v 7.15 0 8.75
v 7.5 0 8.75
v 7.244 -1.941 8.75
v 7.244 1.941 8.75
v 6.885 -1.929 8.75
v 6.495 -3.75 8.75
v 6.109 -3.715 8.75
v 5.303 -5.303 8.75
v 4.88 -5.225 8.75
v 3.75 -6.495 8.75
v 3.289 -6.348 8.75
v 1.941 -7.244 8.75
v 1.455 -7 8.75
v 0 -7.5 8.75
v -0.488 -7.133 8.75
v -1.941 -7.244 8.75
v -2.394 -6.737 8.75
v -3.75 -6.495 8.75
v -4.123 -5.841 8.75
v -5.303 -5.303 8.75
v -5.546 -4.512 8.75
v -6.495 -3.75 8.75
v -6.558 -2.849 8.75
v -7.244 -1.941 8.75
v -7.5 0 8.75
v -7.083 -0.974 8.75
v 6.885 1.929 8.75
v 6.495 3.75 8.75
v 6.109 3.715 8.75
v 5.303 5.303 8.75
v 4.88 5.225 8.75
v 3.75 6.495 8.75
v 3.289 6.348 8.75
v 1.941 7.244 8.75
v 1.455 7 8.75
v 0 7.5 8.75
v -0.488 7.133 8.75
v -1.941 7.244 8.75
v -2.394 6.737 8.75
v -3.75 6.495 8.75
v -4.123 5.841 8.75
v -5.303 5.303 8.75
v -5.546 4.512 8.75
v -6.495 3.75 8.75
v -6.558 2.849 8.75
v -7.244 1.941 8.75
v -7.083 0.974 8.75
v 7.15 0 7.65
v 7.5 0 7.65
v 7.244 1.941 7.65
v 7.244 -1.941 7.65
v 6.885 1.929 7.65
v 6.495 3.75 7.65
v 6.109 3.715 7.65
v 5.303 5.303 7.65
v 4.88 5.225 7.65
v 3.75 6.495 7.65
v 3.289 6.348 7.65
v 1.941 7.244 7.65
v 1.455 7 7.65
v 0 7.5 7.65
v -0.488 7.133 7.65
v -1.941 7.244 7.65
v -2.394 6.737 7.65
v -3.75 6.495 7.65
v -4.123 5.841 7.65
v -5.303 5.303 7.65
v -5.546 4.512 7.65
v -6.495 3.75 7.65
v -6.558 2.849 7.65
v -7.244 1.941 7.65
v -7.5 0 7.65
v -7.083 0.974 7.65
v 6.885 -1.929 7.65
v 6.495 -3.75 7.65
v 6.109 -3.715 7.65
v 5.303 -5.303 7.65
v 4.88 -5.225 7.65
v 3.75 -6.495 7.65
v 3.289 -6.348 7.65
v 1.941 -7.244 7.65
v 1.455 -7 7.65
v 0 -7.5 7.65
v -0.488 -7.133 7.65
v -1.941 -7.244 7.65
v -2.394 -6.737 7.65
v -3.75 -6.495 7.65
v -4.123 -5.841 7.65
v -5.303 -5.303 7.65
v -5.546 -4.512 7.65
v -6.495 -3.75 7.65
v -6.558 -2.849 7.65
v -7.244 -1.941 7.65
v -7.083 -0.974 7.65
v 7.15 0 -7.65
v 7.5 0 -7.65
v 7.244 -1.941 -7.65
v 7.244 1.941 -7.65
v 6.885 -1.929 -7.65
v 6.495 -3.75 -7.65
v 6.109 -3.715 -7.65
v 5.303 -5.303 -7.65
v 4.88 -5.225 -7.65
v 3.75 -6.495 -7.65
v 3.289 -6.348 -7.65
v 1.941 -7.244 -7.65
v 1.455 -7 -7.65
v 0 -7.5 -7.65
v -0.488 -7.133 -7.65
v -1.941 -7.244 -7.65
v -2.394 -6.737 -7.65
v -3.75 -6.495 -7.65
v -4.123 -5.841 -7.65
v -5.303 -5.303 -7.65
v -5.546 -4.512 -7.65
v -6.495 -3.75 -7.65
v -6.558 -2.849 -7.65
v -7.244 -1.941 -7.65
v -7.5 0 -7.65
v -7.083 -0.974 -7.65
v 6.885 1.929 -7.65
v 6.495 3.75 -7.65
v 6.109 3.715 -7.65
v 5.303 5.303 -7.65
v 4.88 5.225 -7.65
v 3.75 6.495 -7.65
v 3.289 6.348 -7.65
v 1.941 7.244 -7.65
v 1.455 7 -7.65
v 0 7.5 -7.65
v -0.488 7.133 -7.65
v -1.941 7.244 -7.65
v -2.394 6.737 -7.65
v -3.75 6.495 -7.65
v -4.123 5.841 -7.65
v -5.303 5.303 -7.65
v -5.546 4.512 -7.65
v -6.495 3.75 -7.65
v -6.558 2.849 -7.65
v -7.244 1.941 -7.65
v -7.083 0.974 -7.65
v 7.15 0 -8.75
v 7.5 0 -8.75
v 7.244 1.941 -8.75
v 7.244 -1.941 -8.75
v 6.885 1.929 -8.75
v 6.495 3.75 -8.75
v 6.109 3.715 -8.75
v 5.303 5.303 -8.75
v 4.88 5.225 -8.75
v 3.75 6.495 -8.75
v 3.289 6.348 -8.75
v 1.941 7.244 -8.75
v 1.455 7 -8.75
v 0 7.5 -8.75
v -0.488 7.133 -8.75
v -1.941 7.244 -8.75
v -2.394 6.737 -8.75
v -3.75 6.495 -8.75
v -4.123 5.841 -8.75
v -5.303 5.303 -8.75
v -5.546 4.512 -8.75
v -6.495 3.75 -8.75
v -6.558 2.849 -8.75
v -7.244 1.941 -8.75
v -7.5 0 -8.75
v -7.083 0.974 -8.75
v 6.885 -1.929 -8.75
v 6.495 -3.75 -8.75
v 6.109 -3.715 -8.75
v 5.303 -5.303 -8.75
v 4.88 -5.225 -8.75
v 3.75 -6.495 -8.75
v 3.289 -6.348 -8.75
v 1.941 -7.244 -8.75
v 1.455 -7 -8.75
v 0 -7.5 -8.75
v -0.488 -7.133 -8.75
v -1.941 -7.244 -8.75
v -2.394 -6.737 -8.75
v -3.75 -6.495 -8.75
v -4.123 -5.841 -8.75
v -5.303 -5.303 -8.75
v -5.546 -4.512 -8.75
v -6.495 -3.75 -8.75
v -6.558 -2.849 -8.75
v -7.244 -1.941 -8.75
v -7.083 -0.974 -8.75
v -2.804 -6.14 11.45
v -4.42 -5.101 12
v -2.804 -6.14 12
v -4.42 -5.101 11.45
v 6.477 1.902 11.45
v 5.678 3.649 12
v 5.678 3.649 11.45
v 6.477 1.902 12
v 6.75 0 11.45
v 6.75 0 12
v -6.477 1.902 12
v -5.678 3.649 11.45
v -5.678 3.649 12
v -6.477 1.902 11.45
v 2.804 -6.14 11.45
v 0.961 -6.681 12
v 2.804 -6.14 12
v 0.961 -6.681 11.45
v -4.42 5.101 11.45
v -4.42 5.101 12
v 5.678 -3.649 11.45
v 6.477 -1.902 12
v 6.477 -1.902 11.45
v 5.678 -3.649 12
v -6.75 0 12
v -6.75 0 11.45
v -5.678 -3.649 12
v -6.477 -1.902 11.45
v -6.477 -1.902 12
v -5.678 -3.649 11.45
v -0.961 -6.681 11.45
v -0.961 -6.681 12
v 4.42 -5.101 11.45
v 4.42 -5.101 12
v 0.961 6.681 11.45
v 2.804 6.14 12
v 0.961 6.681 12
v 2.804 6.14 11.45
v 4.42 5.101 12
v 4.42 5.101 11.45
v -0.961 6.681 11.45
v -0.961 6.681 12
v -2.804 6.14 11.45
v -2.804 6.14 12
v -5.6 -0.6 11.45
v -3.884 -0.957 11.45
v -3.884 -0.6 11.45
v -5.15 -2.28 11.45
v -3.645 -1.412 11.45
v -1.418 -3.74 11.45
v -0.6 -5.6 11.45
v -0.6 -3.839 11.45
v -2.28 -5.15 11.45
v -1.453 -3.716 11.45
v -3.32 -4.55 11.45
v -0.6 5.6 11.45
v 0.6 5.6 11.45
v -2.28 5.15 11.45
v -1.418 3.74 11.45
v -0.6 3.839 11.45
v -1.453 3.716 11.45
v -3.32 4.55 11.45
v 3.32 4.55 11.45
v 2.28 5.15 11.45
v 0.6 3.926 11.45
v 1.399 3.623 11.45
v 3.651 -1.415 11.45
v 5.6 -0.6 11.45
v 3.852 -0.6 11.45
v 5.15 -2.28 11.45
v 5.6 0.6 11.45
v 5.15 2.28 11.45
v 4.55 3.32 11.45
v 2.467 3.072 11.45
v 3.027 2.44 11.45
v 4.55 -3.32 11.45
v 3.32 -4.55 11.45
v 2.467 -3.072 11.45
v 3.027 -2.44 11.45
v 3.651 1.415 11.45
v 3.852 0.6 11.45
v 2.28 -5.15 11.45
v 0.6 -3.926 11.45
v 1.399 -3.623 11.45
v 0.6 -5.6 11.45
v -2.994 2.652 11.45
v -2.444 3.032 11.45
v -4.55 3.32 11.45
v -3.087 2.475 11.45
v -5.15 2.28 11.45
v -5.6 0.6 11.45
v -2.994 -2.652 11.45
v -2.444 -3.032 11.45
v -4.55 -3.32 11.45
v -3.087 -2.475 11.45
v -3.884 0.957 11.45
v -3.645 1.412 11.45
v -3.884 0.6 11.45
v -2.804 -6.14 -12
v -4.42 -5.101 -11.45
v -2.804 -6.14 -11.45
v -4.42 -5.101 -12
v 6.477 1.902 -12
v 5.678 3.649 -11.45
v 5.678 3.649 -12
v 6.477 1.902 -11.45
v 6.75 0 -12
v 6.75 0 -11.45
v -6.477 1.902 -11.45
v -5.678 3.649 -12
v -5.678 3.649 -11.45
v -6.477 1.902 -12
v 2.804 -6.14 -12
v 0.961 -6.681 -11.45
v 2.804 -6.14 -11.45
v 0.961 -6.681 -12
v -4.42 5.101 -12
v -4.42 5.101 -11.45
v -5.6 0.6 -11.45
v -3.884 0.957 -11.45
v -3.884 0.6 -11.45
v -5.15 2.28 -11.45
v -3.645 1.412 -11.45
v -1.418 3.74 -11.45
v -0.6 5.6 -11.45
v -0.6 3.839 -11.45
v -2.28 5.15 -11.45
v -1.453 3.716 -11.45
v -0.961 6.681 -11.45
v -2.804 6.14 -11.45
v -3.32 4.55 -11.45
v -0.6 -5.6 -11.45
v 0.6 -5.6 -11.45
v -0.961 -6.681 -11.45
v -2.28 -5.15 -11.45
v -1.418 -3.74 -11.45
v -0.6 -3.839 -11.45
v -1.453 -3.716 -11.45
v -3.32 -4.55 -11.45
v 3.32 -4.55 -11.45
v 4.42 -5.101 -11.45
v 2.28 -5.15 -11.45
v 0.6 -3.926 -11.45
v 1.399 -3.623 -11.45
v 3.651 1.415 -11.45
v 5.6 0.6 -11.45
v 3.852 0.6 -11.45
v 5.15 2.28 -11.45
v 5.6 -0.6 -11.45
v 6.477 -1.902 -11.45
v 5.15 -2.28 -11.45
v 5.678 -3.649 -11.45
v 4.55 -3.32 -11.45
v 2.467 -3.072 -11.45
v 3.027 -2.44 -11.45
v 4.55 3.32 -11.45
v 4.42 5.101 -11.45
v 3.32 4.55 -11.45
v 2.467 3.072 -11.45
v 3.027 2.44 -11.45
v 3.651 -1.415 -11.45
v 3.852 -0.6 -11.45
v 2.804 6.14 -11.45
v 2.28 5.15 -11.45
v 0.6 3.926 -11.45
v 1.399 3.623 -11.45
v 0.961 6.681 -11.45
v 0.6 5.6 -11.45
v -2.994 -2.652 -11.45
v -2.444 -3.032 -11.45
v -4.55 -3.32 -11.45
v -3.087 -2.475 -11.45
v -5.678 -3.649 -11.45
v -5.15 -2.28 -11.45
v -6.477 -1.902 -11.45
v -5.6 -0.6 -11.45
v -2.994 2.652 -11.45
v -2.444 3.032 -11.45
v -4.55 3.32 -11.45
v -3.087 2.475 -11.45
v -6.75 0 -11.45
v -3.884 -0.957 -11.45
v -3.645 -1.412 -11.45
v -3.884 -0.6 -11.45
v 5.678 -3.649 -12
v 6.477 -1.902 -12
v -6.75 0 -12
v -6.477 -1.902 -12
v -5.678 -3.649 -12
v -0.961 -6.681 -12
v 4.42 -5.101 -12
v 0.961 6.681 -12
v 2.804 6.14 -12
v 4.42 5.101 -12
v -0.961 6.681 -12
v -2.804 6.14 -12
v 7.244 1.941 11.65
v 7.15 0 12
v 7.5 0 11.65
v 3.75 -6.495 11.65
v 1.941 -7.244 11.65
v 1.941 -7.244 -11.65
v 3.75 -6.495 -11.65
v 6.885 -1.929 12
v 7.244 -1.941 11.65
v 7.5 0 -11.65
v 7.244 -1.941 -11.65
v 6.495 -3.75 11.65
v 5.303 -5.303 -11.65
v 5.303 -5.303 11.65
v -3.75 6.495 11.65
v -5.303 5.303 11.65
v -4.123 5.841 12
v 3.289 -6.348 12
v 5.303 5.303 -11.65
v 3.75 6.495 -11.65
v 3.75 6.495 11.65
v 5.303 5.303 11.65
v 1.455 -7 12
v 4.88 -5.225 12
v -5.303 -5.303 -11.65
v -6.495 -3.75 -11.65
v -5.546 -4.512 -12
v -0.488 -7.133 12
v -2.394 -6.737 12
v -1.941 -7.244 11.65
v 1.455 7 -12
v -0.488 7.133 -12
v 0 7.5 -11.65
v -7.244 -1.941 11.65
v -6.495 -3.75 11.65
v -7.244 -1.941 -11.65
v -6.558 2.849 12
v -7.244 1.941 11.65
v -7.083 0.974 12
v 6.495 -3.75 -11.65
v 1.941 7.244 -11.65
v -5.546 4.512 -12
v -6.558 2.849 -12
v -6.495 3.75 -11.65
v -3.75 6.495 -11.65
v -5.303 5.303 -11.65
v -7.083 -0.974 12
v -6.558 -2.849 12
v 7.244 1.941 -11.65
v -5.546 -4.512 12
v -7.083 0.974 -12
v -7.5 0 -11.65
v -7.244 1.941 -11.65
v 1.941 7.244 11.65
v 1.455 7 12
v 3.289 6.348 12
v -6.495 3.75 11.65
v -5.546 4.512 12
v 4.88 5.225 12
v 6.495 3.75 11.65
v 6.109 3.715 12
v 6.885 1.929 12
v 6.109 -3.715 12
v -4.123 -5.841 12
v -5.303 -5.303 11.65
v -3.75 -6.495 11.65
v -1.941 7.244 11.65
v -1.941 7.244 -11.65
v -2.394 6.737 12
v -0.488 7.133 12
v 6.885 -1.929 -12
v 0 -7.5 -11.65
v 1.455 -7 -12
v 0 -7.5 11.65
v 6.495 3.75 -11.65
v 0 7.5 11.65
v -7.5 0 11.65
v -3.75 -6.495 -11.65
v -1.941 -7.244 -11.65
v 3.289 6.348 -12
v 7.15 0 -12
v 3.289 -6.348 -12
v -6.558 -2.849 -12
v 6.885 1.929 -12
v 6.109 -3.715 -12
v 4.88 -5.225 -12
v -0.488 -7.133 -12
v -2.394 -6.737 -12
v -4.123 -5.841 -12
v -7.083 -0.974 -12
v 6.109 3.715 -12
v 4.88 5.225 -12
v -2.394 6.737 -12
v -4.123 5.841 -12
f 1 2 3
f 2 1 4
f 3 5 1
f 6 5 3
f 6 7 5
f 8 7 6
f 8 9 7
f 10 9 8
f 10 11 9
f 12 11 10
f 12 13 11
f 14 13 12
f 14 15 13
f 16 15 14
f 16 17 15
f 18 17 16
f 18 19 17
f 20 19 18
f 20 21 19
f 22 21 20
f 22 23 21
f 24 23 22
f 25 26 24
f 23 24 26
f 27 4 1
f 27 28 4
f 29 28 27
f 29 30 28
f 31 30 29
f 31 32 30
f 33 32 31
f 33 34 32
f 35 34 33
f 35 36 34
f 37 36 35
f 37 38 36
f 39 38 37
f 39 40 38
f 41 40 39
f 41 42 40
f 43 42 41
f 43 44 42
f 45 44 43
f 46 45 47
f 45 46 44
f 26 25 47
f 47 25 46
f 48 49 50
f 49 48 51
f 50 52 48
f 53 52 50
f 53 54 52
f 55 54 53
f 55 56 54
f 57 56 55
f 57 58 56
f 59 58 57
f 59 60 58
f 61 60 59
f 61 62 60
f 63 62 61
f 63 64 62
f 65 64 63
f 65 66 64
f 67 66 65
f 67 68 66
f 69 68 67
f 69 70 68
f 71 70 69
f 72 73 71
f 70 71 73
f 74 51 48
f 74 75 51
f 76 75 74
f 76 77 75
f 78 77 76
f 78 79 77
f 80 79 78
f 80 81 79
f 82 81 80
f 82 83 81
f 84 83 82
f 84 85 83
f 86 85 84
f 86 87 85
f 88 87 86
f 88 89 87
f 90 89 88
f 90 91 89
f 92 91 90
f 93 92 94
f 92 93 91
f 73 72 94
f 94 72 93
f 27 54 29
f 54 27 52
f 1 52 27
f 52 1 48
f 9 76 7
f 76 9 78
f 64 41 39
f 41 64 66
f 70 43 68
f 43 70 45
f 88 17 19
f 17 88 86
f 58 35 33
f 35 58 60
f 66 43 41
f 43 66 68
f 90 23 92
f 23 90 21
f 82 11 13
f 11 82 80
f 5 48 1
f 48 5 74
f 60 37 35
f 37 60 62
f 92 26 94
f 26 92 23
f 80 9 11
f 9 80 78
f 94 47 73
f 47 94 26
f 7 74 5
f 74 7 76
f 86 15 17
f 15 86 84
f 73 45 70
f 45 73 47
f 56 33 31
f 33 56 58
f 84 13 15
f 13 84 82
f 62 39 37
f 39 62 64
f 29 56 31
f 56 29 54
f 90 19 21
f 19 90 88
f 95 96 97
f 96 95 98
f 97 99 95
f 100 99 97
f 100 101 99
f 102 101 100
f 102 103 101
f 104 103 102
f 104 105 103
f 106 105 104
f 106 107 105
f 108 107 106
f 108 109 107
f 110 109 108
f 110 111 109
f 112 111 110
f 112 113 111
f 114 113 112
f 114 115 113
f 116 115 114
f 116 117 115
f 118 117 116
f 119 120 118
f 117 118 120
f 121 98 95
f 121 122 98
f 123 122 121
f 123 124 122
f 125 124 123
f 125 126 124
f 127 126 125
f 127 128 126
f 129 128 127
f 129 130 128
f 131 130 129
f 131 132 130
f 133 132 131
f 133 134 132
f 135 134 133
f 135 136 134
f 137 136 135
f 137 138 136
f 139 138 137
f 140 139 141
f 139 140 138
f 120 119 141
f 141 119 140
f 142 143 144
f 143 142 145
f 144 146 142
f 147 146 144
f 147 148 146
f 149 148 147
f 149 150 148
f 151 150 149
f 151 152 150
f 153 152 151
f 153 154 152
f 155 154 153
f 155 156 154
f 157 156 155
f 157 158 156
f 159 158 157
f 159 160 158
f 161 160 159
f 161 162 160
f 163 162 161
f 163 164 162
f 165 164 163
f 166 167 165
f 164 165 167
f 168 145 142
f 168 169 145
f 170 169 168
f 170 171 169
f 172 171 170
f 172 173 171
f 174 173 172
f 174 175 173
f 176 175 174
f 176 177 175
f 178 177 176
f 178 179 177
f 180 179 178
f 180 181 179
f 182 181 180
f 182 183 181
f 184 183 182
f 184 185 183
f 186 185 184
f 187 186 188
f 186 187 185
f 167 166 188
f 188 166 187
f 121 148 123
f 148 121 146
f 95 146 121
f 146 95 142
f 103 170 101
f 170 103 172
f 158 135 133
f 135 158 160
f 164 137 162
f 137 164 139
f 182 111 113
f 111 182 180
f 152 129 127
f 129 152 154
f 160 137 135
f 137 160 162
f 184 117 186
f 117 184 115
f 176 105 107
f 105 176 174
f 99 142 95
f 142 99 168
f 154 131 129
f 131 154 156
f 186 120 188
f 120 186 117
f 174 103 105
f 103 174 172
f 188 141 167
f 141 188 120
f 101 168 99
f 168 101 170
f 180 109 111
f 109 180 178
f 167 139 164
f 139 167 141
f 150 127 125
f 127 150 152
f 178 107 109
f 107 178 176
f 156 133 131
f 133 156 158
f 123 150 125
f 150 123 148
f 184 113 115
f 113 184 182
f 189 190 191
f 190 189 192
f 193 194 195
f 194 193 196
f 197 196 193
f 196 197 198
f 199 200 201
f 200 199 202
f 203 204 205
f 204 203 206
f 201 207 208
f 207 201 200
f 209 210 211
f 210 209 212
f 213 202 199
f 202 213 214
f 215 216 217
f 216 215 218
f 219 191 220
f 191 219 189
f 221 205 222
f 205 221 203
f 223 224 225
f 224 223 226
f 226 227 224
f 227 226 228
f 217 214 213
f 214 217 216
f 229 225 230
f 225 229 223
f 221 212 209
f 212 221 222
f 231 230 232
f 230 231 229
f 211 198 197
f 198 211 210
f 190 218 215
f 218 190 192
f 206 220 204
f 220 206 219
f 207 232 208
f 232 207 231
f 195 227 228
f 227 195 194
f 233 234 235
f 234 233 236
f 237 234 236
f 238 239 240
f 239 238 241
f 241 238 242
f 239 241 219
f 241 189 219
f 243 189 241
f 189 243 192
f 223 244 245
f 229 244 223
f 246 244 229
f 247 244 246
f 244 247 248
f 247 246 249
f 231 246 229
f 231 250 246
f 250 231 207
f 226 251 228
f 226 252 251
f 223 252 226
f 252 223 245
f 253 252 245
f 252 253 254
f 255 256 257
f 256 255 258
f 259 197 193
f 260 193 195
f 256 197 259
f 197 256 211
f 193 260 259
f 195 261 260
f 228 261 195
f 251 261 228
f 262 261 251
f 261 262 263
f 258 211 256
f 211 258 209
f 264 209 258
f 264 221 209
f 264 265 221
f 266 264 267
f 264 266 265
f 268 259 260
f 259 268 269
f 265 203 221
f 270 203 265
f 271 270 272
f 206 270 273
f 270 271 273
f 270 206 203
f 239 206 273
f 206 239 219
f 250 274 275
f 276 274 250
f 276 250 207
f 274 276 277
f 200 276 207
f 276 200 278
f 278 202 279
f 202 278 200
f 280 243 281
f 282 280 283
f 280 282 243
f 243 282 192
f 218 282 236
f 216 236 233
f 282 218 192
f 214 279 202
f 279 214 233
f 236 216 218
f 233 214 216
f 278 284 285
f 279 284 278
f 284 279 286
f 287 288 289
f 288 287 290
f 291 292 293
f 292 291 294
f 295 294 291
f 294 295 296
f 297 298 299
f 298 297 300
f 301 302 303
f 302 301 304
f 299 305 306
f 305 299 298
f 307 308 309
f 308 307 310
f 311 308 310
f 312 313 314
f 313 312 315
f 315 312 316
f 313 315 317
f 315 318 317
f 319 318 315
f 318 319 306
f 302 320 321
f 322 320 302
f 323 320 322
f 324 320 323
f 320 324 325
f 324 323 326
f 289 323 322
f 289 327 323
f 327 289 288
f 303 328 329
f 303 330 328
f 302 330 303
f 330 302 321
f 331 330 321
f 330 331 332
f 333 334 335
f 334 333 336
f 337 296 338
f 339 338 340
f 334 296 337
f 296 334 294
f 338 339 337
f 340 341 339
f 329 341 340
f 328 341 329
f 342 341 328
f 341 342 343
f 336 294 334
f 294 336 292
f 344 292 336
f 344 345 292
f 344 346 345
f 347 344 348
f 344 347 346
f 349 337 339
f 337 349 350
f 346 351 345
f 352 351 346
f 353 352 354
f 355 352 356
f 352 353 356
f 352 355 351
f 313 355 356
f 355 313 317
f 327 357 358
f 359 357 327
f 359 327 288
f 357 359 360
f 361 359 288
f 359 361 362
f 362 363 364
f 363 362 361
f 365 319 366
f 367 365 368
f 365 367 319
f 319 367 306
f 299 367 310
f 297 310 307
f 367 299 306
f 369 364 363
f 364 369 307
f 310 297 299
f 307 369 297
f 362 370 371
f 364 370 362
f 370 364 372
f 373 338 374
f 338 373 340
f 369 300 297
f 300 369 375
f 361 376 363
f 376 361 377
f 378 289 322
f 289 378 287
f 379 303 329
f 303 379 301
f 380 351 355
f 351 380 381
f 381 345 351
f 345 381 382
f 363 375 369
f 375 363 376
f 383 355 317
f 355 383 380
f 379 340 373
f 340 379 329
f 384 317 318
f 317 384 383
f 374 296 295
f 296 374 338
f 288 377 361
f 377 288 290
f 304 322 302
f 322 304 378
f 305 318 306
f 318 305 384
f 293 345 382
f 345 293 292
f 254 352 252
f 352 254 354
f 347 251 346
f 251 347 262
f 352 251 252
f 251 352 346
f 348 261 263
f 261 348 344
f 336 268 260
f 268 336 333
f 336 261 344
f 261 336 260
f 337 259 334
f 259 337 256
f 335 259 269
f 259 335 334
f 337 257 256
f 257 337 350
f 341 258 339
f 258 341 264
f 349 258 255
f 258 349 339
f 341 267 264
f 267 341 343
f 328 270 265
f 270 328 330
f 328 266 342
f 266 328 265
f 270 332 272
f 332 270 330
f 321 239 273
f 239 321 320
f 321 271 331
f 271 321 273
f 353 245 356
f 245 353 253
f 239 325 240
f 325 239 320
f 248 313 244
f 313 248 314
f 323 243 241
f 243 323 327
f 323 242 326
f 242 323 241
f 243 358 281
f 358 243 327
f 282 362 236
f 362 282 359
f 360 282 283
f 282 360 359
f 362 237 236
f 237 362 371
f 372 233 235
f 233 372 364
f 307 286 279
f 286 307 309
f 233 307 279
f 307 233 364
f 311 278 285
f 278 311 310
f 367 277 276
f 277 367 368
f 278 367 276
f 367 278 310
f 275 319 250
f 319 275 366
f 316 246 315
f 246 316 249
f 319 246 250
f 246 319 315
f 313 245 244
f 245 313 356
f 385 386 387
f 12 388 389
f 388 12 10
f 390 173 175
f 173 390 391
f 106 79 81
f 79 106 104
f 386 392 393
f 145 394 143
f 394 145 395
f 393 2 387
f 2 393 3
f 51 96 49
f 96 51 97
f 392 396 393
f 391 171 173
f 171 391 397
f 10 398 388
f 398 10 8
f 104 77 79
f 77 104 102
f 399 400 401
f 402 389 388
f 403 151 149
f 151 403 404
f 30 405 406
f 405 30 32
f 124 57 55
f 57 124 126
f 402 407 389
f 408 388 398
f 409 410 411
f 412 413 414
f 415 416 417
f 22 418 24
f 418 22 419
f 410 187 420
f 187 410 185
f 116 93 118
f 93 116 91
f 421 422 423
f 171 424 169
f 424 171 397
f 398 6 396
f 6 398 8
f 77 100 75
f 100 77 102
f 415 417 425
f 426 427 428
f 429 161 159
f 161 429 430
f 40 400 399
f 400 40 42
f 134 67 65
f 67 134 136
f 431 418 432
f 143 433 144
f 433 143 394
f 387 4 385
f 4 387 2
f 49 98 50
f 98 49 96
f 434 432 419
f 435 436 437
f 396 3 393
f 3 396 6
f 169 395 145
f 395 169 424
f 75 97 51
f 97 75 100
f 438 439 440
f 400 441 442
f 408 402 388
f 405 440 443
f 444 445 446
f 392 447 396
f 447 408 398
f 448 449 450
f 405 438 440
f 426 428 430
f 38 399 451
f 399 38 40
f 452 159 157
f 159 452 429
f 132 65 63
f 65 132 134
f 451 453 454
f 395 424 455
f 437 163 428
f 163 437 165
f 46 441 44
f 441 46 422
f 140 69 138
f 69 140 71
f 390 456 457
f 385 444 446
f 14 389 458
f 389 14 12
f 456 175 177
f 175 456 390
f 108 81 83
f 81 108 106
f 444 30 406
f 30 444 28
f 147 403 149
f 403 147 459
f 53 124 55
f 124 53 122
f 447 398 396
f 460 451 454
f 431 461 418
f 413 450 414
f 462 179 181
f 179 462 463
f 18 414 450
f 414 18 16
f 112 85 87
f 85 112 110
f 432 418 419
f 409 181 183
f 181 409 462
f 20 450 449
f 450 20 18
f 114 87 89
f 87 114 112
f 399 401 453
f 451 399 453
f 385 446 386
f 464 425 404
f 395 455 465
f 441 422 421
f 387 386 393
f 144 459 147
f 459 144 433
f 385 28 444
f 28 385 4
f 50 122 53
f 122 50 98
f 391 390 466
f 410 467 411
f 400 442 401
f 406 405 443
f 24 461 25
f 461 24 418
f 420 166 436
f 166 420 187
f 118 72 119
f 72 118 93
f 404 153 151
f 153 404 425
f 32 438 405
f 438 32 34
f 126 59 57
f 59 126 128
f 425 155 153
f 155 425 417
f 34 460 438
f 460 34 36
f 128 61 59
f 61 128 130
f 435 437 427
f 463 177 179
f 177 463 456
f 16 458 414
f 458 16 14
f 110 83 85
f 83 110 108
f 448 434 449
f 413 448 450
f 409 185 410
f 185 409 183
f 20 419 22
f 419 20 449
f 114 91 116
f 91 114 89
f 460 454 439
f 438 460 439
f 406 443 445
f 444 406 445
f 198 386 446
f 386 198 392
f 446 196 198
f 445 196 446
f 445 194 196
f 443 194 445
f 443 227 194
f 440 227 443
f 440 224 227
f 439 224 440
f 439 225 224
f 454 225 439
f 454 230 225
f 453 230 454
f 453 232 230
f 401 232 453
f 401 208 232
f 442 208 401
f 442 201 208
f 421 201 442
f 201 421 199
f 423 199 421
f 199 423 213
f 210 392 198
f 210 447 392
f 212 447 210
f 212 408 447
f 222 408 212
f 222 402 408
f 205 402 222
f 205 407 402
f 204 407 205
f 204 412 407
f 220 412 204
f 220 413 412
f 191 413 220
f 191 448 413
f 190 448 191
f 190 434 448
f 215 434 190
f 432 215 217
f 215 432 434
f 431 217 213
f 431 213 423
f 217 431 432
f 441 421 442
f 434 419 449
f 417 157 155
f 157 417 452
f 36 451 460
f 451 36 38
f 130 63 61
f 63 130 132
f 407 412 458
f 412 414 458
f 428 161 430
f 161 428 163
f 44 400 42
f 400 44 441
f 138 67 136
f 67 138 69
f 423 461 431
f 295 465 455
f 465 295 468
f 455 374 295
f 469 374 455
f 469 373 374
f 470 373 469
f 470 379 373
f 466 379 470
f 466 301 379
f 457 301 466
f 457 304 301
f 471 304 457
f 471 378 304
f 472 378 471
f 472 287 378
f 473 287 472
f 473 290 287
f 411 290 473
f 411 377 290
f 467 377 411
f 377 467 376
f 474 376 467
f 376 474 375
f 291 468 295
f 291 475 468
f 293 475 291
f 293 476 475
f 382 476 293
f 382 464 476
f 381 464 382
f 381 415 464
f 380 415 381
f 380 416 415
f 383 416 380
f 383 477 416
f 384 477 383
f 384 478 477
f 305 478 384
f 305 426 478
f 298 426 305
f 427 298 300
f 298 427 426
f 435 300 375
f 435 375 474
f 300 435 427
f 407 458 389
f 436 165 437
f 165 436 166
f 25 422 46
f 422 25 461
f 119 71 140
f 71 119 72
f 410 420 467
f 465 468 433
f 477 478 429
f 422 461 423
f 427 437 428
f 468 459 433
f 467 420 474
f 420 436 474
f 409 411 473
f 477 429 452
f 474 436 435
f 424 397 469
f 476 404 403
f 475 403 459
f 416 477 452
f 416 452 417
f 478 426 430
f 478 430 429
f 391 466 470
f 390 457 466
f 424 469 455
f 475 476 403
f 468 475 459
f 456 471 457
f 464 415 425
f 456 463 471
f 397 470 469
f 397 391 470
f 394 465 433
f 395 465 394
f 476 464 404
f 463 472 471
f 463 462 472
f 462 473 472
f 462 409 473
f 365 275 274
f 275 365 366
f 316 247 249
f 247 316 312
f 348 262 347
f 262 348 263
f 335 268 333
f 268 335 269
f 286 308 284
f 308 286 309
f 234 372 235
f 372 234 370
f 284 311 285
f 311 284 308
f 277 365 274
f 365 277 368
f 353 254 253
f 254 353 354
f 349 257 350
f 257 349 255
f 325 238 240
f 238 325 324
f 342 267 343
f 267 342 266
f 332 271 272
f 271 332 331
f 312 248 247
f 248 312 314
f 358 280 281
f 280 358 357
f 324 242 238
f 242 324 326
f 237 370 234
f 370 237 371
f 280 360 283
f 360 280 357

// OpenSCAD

// Open SCAD model of linear Bearing LM-8-UU & KB-12-WW

//     LM-8-UU        KB-12-WW
//	D_Int =  8.0	D_Int = 12.0
//	D_Ext = 15.0	D_Ext = 22.0
//	D_1   = 14.3	D_1   = 21.0
//	L     = 24.0	L     = 32.0
//	W     =  1.1	W     =  1.3
//	B     = 17.5	B     = 22.9

depth = 1.6;  // Groove depth
width = 1.2;    // Groove width
count = 12;    // Groove count


module groove(d1, d2, w) {
	difference() {
		cylinder(r=d1/2+1, h=w, center=true);
		cylinder(r=d2/2  , h=w, center=true);
	}
}

module lb(D_Int=8, D_Ext=15, D_1=14.3, L=24, W=1.1, B=17.5) {
chamf = D_Ext - D_1;
	difference() {
		hull() {
			cylinder(r=D_Ext/2, h=L-chamf, center=true);
			cylinder(r=D_1  /2, h=L      , center=true);
		}
		cylinder(r=D_Int/2, h=L+2    , center=true);
        %cylinder(r = D_Int/ 2, h=L+20, $fn=256, center=true);
		translate([0, 0, B/2-W/2]) groove(D_Ext, D_1, W);
		translate([0, 0,-B/2+W/2]) groove(D_Ext, D_1, W);
		translate([0, 0,     L/2]) groove(D_Ext-(D_Ext-D_Int)/2, 1, W);
		translate([0, 0,    -L/2]) groove(D_Ext-(D_Ext-D_Int)/2, 1, W);
        
        for (i = [0:count]) assign( grooveAngle=(i+1)*360/count) {
            rotate(90-grooveAngle) translate([0,-(width/2),-(L/2)])
            cube(size=[(D_Int/2)+depth, width, L], center=false);
        }

    
	}
    
}


module linear_bearing(linear_bearing_type) {
	if(linear_bearing_type == "LM-8-UU") {   //LM-8-UU
		lb(D_Int=8, D_Ext=15, D_1=14.3, L=24, W=1.1, B=17.5);
	}
	else {
		if(linear_bearing_type == "KB-12-WW") {   //KB-12-WW
			lb(D_Int=12, D_Ext=22, D_1=21, L=32, W=1.3, B=22.9);
		}
	}
}

linear_bearing("LM-8-UU" );
